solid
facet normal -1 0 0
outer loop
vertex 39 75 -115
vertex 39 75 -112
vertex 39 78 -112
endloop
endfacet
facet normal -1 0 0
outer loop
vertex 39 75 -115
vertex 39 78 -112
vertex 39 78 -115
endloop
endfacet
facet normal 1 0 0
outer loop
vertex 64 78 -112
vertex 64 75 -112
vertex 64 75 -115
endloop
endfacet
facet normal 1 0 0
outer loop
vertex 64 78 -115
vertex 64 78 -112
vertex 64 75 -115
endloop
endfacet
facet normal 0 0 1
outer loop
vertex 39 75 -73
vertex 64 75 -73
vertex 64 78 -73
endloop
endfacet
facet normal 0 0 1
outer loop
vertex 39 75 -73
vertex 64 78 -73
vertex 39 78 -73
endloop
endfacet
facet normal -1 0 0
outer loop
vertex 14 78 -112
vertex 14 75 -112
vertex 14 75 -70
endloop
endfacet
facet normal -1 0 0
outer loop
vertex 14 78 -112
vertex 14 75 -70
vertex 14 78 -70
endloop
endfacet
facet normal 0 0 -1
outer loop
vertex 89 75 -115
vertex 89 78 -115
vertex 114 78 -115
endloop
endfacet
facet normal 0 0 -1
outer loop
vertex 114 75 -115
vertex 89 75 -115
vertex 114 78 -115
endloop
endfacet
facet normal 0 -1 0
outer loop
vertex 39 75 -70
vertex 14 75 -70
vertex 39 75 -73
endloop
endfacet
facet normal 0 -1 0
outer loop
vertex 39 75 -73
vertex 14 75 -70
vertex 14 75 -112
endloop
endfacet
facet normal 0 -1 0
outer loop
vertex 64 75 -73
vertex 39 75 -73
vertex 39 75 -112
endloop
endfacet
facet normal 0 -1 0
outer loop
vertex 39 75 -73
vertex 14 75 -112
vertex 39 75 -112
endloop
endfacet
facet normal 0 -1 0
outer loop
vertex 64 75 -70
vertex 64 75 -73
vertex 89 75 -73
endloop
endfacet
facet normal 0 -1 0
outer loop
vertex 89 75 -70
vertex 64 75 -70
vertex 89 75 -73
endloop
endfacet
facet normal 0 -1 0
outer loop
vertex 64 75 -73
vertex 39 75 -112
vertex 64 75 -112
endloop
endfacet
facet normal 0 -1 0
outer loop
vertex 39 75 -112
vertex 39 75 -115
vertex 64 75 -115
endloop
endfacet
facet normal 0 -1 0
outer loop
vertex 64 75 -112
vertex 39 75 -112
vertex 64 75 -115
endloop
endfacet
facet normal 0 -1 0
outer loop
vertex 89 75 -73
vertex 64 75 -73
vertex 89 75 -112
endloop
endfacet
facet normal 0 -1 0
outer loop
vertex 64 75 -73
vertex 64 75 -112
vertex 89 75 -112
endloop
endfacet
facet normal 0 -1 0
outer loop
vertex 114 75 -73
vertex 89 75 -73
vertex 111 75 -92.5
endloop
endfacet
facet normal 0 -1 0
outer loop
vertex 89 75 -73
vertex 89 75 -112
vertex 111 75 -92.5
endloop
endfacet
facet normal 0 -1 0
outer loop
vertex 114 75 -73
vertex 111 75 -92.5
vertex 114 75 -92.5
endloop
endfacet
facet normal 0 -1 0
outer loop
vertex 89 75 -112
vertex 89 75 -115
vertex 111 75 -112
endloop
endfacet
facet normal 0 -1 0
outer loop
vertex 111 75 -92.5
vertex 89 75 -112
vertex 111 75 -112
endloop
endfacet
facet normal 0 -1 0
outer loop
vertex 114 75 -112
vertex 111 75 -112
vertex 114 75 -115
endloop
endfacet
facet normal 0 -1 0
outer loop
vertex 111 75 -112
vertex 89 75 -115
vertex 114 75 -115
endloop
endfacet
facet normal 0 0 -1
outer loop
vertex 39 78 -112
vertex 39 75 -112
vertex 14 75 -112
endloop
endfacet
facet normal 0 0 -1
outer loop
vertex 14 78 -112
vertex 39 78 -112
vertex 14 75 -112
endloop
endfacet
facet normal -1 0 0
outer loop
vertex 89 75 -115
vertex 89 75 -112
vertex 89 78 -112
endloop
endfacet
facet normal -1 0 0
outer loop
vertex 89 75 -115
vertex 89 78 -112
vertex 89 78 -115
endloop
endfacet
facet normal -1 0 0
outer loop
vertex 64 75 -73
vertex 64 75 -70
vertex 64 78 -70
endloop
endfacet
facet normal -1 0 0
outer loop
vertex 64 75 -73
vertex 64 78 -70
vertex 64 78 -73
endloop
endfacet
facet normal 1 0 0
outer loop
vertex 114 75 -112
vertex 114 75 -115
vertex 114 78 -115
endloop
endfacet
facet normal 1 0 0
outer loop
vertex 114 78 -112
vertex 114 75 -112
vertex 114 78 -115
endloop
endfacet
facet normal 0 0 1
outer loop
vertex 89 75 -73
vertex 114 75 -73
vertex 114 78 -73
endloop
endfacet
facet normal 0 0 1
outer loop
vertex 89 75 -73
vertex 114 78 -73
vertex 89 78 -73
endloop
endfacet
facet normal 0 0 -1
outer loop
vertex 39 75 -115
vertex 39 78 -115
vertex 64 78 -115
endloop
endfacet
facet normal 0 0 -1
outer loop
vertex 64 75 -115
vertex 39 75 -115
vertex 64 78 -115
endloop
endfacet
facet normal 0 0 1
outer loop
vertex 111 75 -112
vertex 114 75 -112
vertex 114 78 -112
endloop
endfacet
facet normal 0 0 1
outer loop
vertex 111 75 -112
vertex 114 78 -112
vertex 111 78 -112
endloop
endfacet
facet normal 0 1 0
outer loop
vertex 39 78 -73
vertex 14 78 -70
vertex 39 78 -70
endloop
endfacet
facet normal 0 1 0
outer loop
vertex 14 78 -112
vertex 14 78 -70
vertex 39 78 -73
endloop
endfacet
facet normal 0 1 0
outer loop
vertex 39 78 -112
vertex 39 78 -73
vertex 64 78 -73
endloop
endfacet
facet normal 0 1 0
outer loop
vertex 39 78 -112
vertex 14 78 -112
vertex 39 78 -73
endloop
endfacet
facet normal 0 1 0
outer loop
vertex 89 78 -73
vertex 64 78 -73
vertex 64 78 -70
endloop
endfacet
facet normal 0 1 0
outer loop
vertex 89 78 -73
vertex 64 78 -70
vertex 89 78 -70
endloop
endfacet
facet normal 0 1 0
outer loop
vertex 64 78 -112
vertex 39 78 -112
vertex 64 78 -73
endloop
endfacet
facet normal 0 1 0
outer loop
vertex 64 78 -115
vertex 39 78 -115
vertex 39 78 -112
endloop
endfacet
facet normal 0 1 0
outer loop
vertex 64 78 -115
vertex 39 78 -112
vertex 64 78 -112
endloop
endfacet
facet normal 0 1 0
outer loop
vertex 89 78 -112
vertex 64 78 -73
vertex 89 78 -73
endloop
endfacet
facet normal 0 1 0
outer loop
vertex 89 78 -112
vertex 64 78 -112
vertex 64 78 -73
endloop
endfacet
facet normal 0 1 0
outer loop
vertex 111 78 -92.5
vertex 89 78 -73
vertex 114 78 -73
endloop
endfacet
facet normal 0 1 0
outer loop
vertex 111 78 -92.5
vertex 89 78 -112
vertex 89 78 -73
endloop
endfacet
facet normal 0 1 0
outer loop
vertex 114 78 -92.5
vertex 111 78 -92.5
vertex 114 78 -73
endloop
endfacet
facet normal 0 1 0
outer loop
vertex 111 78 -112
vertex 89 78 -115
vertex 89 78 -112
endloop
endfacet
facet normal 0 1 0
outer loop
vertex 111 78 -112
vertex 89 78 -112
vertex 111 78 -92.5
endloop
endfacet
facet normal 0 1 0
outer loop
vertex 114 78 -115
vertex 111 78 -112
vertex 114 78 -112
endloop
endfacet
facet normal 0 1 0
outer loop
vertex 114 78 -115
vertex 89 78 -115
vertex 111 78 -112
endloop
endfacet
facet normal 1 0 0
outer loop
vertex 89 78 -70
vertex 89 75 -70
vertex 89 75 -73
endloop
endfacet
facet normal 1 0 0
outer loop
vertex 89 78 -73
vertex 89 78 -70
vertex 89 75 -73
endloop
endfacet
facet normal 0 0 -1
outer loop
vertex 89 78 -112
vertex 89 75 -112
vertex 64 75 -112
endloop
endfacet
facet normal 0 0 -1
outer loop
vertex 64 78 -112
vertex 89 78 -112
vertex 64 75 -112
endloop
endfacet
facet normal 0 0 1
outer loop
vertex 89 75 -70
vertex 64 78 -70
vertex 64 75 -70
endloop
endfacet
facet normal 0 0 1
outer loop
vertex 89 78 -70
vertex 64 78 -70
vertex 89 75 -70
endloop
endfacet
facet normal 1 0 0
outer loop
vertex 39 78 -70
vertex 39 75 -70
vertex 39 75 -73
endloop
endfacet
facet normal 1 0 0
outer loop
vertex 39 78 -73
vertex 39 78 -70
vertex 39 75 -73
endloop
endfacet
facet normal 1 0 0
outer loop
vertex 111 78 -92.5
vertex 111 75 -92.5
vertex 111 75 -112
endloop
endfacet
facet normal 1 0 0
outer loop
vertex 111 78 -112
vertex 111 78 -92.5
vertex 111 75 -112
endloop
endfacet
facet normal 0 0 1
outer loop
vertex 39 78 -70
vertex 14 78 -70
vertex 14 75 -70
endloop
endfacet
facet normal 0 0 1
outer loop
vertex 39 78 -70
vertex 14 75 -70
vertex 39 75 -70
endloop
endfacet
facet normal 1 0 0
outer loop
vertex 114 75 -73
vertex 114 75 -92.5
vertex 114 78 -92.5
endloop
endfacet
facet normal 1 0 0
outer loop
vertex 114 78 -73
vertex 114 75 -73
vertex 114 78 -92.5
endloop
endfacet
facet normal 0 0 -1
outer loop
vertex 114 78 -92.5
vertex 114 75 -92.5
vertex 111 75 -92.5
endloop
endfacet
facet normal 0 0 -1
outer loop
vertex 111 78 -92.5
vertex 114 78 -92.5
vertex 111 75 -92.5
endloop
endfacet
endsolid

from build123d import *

# Parameters (mm, degrees)
RECTANGLE130_AS_DRAWN_W                      = 25
RECTANGLE130_AS_DRAWN_H                      = 3
EXTRUDE152_DEPTH                             = 3
EXTRUDE152_ONTO_RECTANGLE130_ROLL_ANGLE      = -90
EXTRUDE152_ONTO_RECTANGLE130_PLACEMENT_ANGLE = 180
RECTANGLE128_AS_DRAWN_W                      = 25
RECTANGLE128_AS_DRAWN_H                      = 3
EXTRUDE153_DEPTH                             = 3
EXTRUDE153_ONTO_RECTANGLE128_ROLL_ANGLE      = -90
EXTRUDE153_ONTO_RECTANGLE128_PLACEMENT_ANGLE = 180
RECTANGLE132_AS_DRAWN_W                      = 3
RECTANGLE132_AS_DRAWN_H                      = 19.5
EXTRUDE166_DEPTH                             = 3
EXTRUDE166_ONTO_RECTANGLE132_ROLL_ANGLE      = -90
EXTRUDE166_ONTO_RECTANGLE132_PLACEMENT_ANGLE = 180
RECTANGLE127_AS_DRAWN_W                      = 25
RECTANGLE127_AS_DRAWN_H                      = 3
EXTRUDE147_DEPTH                             = 3
EXTRUDE147_ONTO_RECTANGLE127_ROLL_ANGLE      = -90
EXTRUDE147_ONTO_RECTANGLE127_PLACEMENT_ANGLE = 180
RECTANGLE129_AS_DRAWN_W                      = 25
RECTANGLE129_AS_DRAWN_H                      = 3
EXTRUDE149_DEPTH                             = 3
EXTRUDE149_ONTO_RECTANGLE129_ROLL_ANGLE      = -90
EXTRUDE149_ONTO_RECTANGLE129_PLACEMENT_ANGLE = 180
BOX045_W                                     = 100
BOX045_H                                     = 3
BOX045_DEPTH                                 = 45


with BuildPart() as extrude152:
    # Rectangle130 as drawn → Extrude152 (new)
    with BuildSketch(Plane.XY):
        with Locations((12.5, 1.5)):
            Rectangle(RECTANGLE130_AS_DRAWN_W, RECTANGLE130_AS_DRAWN_H)
    extrude(amount=-EXTRUDE152_DEPTH)


with BuildPart() as extrude152_1:
    # Extrude152 onto Rectangle130 roll: moved
    add(extrude152.part.rotate(Axis((0, 0, 0), (1, 0, 0)), EXTRUDE152_ONTO_RECTANGLE130_ROLL_ANGLE))


with BuildPart() as extrude152_2:
    # Extrude152 onto Rectangle130 placement: moved
    add(extrude152_1.part.moved(Location((39, -77, -70))).rotate(Axis((39, -77, -70), (0, 0, 1)), EXTRUDE152_ONTO_RECTANGLE130_PLACEMENT_ANGLE))


with BuildPart() as extrude152_3:
    # Extrude152 placement: moved
    add(extrude152_2.part.moved(Location((0, 0, -42))))


with BuildPart() as extrude153:
    # Rectangle128 as drawn → Extrude153 (new)
    with BuildSketch(Plane.XY):
        with Locations((12.5, 1.5)):
            Rectangle(RECTANGLE128_AS_DRAWN_W, RECTANGLE128_AS_DRAWN_H)
    extrude(amount=-EXTRUDE153_DEPTH)


with BuildPart() as extrude153_1:
    # Extrude153 onto Rectangle128 roll: moved
    add(extrude153.part.rotate(Axis((0, 0, 0), (1, 0, 0)), EXTRUDE153_ONTO_RECTANGLE128_ROLL_ANGLE))


with BuildPart() as extrude153_2:
    # Extrude153 onto Rectangle128 placement: moved
    add(extrude153_1.part.moved(Location((89, -77, -70))).rotate(Axis((89, -77, -70), (0, 0, 1)), EXTRUDE153_ONTO_RECTANGLE128_PLACEMENT_ANGLE))


with BuildPart() as extrude153_3:
    # Extrude153 placement: moved
    add(extrude153_2.part.moved(Location((0, 0, -42))))


with BuildPart() as extrude166:
    # Rectangle132 as drawn → Extrude166 (new)
    with BuildSketch(Plane.XY):
        with Locations((1.5, 9.75)):
            Rectangle(RECTANGLE132_AS_DRAWN_W, RECTANGLE132_AS_DRAWN_H)
    extrude(amount=-EXTRUDE166_DEPTH)


with BuildPart() as extrude166_1:
    # Extrude166 onto Rectangle132 roll: moved
    add(extrude166.part.rotate(Axis((0, 0, 0), (1, 0, 0)), EXTRUDE166_ONTO_RECTANGLE132_ROLL_ANGLE))


with BuildPart() as extrude166_2:
    # Extrude166 onto Rectangle132 placement: moved
    add(extrude166_1.part.moved(Location((114, -77, -92.5))).rotate(Axis((114, -77, -92.5), (0, 0, 1)), EXTRUDE166_ONTO_RECTANGLE132_PLACEMENT_ANGLE))


with BuildPart() as extrude147:
    # Rectangle127 as drawn → Extrude147 (new)
    with BuildSketch(Plane.XY):
        with Locations((12.5, 1.5)):
            Rectangle(RECTANGLE127_AS_DRAWN_W, RECTANGLE127_AS_DRAWN_H)
    extrude(amount=-EXTRUDE147_DEPTH)


with BuildPart() as extrude147_1:
    # Extrude147 onto Rectangle127 roll: moved
    add(extrude147.part.rotate(Axis((0, 0, 0), (1, 0, 0)), EXTRUDE147_ONTO_RECTANGLE127_ROLL_ANGLE))


with BuildPart() as extrude147_2:
    # Extrude147 onto Rectangle127 placement: moved
    add(extrude147_1.part.moved(Location((114, -77, -70))).rotate(Axis((114, -77, -70), (0, 0, 1)), EXTRUDE147_ONTO_RECTANGLE127_PLACEMENT_ANGLE))


with BuildPart() as fusion064026:
    # Rectangle129 as drawn → Extrude149 (new)
    with BuildSketch(Plane.XY):
        with Locations((12.5, 1.5)):
            Rectangle(RECTANGLE129_AS_DRAWN_W, RECTANGLE129_AS_DRAWN_H)
    extrude(amount=-EXTRUDE149_DEPTH)


with BuildPart() as fusion064026_1:
    # Extrude149 onto Rectangle129 roll: moved
    add(fusion064026.part.rotate(Axis((0, 0, 0), (1, 0, 0)), EXTRUDE149_ONTO_RECTANGLE129_ROLL_ANGLE))


with BuildPart() as fusion064026_2:
    # Extrude149 onto Rectangle129 placement: moved
    add(fusion064026_1.part.moved(Location((64, -77, -70))).rotate(Axis((64, -77, -70), (0, 0, 1)), EXTRUDE149_ONTO_RECTANGLE129_PLACEMENT_ANGLE))

    # Fusion064026: union Extrude152, Extrude153, Extrude166, Extrude147
    add(extrude152_3.part)
    add(extrude153_3.part)
    add(extrude166_2.part)
    add(extrude147_2.part)


with BuildPart() as fusion064026_3:
    # Fusion064026 placement: moved
    add(fusion064026_2.part.moved(Location((0, 152, 0))))


with BuildPart() as cut035015:
    # Box045 → Box045 (new body)
    with BuildSketch(Plane(origin=(14, 75, -115), x_dir=(1, 0, 0), z_dir=(0, 0, 1))):
        with Locations((50, 1.5)):
            Rectangle(BOX045_W, BOX045_H)
    extrude(amount=BOX045_DEPTH)

    # Cut035015: cut Fusion064026
    add(fusion064026_3.part, mode=Mode.SUBTRACT)


solid = cut035015.part
